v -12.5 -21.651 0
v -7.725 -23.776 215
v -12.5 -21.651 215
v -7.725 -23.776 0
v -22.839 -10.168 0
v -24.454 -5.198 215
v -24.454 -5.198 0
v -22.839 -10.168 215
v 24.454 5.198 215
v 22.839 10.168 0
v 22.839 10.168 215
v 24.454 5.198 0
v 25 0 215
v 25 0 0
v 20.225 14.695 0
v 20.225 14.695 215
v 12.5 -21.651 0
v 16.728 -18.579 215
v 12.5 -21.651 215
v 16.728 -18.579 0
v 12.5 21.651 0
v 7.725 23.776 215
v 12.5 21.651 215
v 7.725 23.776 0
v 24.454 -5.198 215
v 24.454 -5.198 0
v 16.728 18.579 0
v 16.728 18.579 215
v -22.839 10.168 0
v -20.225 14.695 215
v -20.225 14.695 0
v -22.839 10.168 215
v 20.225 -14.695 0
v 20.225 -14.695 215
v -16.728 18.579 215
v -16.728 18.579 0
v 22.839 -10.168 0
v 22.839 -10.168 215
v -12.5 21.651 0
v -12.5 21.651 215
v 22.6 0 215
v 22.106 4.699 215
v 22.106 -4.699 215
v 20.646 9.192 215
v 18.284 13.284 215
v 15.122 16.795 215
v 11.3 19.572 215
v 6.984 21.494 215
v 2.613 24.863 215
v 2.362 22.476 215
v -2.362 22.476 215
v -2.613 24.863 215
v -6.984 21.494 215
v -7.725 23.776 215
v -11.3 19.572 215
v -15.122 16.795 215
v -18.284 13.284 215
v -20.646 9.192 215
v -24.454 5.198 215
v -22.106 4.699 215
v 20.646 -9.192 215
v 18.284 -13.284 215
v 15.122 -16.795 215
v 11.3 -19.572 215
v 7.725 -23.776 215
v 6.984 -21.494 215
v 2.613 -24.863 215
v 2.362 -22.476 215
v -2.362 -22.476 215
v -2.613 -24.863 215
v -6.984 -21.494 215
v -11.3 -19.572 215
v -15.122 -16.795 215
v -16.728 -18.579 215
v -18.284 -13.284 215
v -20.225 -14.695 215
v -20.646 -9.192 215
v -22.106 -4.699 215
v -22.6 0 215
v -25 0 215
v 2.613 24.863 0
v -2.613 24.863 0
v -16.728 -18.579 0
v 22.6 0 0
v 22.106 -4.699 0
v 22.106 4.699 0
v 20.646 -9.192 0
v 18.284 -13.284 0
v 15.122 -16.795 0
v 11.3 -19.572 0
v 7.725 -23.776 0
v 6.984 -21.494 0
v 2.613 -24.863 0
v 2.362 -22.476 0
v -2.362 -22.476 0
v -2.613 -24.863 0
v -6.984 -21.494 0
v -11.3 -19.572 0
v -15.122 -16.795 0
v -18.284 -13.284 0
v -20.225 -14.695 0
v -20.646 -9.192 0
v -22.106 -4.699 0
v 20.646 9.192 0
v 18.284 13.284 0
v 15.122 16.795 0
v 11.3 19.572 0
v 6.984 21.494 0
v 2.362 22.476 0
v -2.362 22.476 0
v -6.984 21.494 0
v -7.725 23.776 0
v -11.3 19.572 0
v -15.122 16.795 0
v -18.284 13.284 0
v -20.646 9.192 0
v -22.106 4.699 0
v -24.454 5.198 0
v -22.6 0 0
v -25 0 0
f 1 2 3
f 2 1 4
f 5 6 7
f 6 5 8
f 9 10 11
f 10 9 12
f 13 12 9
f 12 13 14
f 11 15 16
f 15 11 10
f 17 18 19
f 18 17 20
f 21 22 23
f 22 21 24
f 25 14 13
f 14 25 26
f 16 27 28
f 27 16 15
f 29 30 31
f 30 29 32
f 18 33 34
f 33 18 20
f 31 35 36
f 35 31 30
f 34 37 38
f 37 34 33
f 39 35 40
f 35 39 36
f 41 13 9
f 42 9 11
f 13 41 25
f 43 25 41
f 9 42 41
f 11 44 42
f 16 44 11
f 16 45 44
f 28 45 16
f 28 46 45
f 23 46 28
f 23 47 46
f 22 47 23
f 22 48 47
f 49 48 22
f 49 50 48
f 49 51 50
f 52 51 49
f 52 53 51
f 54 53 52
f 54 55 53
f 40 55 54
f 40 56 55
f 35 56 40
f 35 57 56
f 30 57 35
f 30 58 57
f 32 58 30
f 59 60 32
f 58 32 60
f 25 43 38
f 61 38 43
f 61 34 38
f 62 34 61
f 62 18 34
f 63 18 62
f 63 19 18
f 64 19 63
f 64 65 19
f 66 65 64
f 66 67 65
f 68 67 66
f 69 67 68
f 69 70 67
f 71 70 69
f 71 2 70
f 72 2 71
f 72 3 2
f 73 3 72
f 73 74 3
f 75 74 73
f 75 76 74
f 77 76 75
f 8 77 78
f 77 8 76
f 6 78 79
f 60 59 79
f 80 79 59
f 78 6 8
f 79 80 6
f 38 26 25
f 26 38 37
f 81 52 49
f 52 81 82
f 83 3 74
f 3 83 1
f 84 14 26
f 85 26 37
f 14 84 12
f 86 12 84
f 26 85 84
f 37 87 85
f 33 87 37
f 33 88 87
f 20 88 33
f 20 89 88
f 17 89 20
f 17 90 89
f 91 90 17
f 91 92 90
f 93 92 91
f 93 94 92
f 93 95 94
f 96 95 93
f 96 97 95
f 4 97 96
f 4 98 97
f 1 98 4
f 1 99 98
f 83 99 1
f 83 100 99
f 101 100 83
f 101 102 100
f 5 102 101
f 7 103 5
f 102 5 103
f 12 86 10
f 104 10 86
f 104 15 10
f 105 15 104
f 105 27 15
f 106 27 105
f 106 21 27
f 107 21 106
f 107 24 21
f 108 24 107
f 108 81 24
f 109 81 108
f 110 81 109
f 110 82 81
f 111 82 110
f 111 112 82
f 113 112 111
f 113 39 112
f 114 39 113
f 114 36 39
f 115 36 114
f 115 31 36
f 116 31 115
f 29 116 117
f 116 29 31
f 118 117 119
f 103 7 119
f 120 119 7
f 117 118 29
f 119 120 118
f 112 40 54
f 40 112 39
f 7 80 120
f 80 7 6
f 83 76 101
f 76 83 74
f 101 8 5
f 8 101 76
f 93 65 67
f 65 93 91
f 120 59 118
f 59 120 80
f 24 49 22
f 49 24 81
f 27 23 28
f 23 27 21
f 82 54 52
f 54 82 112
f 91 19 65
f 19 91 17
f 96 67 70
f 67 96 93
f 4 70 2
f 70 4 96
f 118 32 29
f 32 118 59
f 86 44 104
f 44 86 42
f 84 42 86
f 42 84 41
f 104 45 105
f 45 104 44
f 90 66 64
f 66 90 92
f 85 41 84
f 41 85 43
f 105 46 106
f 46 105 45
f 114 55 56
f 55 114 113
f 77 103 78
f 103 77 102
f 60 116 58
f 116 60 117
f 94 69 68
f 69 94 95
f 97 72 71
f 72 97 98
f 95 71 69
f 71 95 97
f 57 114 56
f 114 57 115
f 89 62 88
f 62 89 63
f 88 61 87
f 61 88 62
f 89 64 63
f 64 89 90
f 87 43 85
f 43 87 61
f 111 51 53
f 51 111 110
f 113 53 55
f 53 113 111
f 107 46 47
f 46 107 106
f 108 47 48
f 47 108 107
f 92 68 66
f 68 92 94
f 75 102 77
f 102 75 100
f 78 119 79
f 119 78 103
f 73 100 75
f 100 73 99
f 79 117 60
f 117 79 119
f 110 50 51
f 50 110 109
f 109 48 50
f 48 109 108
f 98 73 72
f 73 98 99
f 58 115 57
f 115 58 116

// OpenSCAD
// Parameters
pipe_standard = 1; //[1:1:1]
nominal_diameter_mm = 50; //[25:100:1]
length_mm = 250; //[125:500:1]
end_fitting = 1; //[0:1:1]
pipe_od_mm = 50; //[25:100:1]
pipe_wall_mm = 2.4; //[1.2:4.8:0.1]
fit_length_mm = 35; //[18:70:1]
fit_wall_extra_mm = 1.6; //[0.8:3.2:0.1]
fit_clearance_mm = 0.4; //[0.2:1.0:0.1]
connect_overlap_mm = 1; //[0.5:2:0.1]

// Module for HT Pipe
module ht_pipe() {
  color([0.85, 0.85, 0.8]) { // PVC color
    // Pipe outer cylinder
    cylinder(h=length_mm - end_fitting * fit_length_mm, r=pipe_od_mm / 2, center=false);
    
    // Pipe inner void
    translate([0, 0, 0])
      cylinder(h=length_mm - end_fitting * fit_length_mm, r=pipe_od_mm / 2 - pipe_wall_mm, center=false);
    
    // Fitting outer cylinder
    translate([0, 0, length_mm - end_fitting * fit_length_mm - connect_overlap_mm])
      cylinder(h=end_fitting * fit_length_mm, r=pipe_od_mm / 2 + end_fitting * fit_wall_extra_mm, center=false);
    
    // Fitting inner void
    translate([0, 0, length_mm - end_fitting * fit_length_mm - connect_overlap_mm])
      cylinder(h=end_fitting * fit_length_mm + connect_overlap_mm, r=pipe_od_mm / 2 + end_fitting * fit_clearance_mm, center=false);
  }
}

// Module for the complete assembly
module assembly() {
  difference() {
    // HT Pipe Tube
    difference() {
      // Outer pipe
      cylinder(h=length_mm - end_fitting * fit_length_mm, r=pipe_od_mm / 2, center=false);
      // Inner void
      translate([0, 0, 0])
        cylinder(h=length_mm - end_fitting * fit_length_mm, r=pipe_od_mm / 2 - pipe_wall_mm, center=false);
    }
    // Integrated end fitting
    difference() {
      // Outer fitting
      translate([0, 0, length_mm - end_fitting * fit_length_mm - connect_overlap_mm])
        cylinder(h=end_fitting * fit_length_mm, r=pipe_od_mm / 2 + end_fitting * fit_wall_extra_mm, center=false);
      // Inner void
      translate([0, 0, length_mm - end_fitting * fit_length_mm - connect_overlap_mm])
        cylinder(h=end_fitting * fit_length_mm + connect_overlap_mm, r=pipe_od_mm / 2 + end_fitting * fit_clearance_mm, center=false);
    }
  }
}

// Call the assembly
assembly();
